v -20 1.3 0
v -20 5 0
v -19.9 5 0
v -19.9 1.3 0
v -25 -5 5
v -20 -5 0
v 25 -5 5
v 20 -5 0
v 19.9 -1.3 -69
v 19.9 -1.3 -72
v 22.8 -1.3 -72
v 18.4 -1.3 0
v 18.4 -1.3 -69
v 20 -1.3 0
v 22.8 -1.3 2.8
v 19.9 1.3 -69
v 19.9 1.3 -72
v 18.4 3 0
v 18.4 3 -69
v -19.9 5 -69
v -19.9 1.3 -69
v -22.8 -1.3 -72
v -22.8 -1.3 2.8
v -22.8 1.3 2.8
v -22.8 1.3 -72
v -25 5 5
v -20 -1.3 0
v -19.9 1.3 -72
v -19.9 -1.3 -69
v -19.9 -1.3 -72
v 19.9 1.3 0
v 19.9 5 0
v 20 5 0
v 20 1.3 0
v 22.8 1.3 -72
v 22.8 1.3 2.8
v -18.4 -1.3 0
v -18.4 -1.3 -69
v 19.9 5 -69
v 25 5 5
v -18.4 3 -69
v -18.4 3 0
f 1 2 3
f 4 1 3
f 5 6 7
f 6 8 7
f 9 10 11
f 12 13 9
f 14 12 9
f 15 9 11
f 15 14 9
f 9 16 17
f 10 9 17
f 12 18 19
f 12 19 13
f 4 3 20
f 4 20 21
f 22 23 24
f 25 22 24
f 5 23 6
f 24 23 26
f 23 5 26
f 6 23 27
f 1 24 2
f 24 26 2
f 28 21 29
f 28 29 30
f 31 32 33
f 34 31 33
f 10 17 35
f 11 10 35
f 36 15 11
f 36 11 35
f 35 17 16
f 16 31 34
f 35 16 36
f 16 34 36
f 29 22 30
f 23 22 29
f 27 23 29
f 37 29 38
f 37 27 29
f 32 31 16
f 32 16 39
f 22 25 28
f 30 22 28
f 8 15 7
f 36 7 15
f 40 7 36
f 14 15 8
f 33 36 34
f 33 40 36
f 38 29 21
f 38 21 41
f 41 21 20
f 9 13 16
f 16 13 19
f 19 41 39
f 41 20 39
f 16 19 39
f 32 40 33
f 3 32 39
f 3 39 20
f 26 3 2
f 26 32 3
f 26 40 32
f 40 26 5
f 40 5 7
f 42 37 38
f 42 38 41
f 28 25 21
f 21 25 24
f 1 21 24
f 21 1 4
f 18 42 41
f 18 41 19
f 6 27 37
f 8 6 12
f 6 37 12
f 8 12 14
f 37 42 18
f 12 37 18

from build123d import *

# Parameters (mm, degrees)
SKETCH1_W               = 50
SKETCH1_H               = 10
BOSS_EXTRUDE1_DEPTH     = 5
CUT_EXTRUDE1_DEPTH      = 6
CUT_EXTRUDE1_DEPTH_BACK = 6
SKETCH3_W               = 45.6
SKETCH3_H               = 2.6
BOSS_EXTRUDE2_DEPTH     = 77
SKETCH4_W               = 39.8
SKETCH4_H               = 72
CUT_EXTRUDE2_DEPTH      = 77
BOSS_EXTRUDE3_DEPTH     = 72
SKETCH7_W               = 39.8
SKETCH7_H               = 3
CUT_EXTRUDE3_DEPTH      = 10


with BuildPart() as part:
    # Sketch1 → Boss-Extrude1 (new body)
    with BuildSketch(Plane.XY):
        Rectangle(SKETCH1_W, SKETCH1_H)
    extrude(amount=BOSS_EXTRUDE1_DEPTH)

    # Sketch2 → Cut-Extrude1 (cut, two sides)
    with BuildSketch(Plane(origin=(0, 0, 0), x_dir=(1, 0, 0), z_dir=(0, 1, 0))) as cut_extrude1_sk:
        Polygon((-25, -5), (-20, 0), (-25, 0), align=None)
        Polygon((25, -5), (20, 0), (25, 0), align=None)
    extrude(amount=CUT_EXTRUDE1_DEPTH, mode=Mode.SUBTRACT)
    extrude(cut_extrude1_sk.sketch, amount=-CUT_EXTRUDE1_DEPTH_BACK, mode=Mode.SUBTRACT)

    # Sketch3 → Boss-Extrude2 (add)
    with BuildSketch(Plane.XY.offset(5)):
        Rectangle(SKETCH3_W, SKETCH3_H)
    extrude(amount=-BOSS_EXTRUDE2_DEPTH)

    # Sketch4 → Cut-Extrude2 (cut)
    with BuildSketch(Plane(origin=(0, 1.3, 0), x_dir=(1, 0, 0), z_dir=(0, 1, 0))):
        with Locations((0, 36)):
            Rectangle(SKETCH4_W, SKETCH4_H)
    extrude(amount=-CUT_EXTRUDE2_DEPTH, mode=Mode.SUBTRACT)

    # Sketch6 → Boss-Extrude3 (add)
    with BuildSketch(Plane(origin=(0, 0, 0), x_dir=(-1, 0, 0), z_dir=(0, 0, -1))):
        Polygon((-19.9, -1.3), (-19.9, 5), (19.9, 5), (19.9, -1.3), (18.4, -1.3), (18.4, 3), (-18.4, 3), (-18.4, -1.3), align=None)
    extrude(amount=BOSS_EXTRUDE3_DEPTH)

    # Sketch7 → Cut-Extrude3 (cut)
    with BuildSketch(Plane(origin=(0, 5, 0), x_dir=(1, 0, 0), z_dir=(0, 1, 0))):
        with Locations((0, 70.5)):
            Rectangle(SKETCH7_W, SKETCH7_H)
    extrude(amount=-CUT_EXTRUDE3_DEPTH, mode=Mode.SUBTRACT)


solid = part.part
